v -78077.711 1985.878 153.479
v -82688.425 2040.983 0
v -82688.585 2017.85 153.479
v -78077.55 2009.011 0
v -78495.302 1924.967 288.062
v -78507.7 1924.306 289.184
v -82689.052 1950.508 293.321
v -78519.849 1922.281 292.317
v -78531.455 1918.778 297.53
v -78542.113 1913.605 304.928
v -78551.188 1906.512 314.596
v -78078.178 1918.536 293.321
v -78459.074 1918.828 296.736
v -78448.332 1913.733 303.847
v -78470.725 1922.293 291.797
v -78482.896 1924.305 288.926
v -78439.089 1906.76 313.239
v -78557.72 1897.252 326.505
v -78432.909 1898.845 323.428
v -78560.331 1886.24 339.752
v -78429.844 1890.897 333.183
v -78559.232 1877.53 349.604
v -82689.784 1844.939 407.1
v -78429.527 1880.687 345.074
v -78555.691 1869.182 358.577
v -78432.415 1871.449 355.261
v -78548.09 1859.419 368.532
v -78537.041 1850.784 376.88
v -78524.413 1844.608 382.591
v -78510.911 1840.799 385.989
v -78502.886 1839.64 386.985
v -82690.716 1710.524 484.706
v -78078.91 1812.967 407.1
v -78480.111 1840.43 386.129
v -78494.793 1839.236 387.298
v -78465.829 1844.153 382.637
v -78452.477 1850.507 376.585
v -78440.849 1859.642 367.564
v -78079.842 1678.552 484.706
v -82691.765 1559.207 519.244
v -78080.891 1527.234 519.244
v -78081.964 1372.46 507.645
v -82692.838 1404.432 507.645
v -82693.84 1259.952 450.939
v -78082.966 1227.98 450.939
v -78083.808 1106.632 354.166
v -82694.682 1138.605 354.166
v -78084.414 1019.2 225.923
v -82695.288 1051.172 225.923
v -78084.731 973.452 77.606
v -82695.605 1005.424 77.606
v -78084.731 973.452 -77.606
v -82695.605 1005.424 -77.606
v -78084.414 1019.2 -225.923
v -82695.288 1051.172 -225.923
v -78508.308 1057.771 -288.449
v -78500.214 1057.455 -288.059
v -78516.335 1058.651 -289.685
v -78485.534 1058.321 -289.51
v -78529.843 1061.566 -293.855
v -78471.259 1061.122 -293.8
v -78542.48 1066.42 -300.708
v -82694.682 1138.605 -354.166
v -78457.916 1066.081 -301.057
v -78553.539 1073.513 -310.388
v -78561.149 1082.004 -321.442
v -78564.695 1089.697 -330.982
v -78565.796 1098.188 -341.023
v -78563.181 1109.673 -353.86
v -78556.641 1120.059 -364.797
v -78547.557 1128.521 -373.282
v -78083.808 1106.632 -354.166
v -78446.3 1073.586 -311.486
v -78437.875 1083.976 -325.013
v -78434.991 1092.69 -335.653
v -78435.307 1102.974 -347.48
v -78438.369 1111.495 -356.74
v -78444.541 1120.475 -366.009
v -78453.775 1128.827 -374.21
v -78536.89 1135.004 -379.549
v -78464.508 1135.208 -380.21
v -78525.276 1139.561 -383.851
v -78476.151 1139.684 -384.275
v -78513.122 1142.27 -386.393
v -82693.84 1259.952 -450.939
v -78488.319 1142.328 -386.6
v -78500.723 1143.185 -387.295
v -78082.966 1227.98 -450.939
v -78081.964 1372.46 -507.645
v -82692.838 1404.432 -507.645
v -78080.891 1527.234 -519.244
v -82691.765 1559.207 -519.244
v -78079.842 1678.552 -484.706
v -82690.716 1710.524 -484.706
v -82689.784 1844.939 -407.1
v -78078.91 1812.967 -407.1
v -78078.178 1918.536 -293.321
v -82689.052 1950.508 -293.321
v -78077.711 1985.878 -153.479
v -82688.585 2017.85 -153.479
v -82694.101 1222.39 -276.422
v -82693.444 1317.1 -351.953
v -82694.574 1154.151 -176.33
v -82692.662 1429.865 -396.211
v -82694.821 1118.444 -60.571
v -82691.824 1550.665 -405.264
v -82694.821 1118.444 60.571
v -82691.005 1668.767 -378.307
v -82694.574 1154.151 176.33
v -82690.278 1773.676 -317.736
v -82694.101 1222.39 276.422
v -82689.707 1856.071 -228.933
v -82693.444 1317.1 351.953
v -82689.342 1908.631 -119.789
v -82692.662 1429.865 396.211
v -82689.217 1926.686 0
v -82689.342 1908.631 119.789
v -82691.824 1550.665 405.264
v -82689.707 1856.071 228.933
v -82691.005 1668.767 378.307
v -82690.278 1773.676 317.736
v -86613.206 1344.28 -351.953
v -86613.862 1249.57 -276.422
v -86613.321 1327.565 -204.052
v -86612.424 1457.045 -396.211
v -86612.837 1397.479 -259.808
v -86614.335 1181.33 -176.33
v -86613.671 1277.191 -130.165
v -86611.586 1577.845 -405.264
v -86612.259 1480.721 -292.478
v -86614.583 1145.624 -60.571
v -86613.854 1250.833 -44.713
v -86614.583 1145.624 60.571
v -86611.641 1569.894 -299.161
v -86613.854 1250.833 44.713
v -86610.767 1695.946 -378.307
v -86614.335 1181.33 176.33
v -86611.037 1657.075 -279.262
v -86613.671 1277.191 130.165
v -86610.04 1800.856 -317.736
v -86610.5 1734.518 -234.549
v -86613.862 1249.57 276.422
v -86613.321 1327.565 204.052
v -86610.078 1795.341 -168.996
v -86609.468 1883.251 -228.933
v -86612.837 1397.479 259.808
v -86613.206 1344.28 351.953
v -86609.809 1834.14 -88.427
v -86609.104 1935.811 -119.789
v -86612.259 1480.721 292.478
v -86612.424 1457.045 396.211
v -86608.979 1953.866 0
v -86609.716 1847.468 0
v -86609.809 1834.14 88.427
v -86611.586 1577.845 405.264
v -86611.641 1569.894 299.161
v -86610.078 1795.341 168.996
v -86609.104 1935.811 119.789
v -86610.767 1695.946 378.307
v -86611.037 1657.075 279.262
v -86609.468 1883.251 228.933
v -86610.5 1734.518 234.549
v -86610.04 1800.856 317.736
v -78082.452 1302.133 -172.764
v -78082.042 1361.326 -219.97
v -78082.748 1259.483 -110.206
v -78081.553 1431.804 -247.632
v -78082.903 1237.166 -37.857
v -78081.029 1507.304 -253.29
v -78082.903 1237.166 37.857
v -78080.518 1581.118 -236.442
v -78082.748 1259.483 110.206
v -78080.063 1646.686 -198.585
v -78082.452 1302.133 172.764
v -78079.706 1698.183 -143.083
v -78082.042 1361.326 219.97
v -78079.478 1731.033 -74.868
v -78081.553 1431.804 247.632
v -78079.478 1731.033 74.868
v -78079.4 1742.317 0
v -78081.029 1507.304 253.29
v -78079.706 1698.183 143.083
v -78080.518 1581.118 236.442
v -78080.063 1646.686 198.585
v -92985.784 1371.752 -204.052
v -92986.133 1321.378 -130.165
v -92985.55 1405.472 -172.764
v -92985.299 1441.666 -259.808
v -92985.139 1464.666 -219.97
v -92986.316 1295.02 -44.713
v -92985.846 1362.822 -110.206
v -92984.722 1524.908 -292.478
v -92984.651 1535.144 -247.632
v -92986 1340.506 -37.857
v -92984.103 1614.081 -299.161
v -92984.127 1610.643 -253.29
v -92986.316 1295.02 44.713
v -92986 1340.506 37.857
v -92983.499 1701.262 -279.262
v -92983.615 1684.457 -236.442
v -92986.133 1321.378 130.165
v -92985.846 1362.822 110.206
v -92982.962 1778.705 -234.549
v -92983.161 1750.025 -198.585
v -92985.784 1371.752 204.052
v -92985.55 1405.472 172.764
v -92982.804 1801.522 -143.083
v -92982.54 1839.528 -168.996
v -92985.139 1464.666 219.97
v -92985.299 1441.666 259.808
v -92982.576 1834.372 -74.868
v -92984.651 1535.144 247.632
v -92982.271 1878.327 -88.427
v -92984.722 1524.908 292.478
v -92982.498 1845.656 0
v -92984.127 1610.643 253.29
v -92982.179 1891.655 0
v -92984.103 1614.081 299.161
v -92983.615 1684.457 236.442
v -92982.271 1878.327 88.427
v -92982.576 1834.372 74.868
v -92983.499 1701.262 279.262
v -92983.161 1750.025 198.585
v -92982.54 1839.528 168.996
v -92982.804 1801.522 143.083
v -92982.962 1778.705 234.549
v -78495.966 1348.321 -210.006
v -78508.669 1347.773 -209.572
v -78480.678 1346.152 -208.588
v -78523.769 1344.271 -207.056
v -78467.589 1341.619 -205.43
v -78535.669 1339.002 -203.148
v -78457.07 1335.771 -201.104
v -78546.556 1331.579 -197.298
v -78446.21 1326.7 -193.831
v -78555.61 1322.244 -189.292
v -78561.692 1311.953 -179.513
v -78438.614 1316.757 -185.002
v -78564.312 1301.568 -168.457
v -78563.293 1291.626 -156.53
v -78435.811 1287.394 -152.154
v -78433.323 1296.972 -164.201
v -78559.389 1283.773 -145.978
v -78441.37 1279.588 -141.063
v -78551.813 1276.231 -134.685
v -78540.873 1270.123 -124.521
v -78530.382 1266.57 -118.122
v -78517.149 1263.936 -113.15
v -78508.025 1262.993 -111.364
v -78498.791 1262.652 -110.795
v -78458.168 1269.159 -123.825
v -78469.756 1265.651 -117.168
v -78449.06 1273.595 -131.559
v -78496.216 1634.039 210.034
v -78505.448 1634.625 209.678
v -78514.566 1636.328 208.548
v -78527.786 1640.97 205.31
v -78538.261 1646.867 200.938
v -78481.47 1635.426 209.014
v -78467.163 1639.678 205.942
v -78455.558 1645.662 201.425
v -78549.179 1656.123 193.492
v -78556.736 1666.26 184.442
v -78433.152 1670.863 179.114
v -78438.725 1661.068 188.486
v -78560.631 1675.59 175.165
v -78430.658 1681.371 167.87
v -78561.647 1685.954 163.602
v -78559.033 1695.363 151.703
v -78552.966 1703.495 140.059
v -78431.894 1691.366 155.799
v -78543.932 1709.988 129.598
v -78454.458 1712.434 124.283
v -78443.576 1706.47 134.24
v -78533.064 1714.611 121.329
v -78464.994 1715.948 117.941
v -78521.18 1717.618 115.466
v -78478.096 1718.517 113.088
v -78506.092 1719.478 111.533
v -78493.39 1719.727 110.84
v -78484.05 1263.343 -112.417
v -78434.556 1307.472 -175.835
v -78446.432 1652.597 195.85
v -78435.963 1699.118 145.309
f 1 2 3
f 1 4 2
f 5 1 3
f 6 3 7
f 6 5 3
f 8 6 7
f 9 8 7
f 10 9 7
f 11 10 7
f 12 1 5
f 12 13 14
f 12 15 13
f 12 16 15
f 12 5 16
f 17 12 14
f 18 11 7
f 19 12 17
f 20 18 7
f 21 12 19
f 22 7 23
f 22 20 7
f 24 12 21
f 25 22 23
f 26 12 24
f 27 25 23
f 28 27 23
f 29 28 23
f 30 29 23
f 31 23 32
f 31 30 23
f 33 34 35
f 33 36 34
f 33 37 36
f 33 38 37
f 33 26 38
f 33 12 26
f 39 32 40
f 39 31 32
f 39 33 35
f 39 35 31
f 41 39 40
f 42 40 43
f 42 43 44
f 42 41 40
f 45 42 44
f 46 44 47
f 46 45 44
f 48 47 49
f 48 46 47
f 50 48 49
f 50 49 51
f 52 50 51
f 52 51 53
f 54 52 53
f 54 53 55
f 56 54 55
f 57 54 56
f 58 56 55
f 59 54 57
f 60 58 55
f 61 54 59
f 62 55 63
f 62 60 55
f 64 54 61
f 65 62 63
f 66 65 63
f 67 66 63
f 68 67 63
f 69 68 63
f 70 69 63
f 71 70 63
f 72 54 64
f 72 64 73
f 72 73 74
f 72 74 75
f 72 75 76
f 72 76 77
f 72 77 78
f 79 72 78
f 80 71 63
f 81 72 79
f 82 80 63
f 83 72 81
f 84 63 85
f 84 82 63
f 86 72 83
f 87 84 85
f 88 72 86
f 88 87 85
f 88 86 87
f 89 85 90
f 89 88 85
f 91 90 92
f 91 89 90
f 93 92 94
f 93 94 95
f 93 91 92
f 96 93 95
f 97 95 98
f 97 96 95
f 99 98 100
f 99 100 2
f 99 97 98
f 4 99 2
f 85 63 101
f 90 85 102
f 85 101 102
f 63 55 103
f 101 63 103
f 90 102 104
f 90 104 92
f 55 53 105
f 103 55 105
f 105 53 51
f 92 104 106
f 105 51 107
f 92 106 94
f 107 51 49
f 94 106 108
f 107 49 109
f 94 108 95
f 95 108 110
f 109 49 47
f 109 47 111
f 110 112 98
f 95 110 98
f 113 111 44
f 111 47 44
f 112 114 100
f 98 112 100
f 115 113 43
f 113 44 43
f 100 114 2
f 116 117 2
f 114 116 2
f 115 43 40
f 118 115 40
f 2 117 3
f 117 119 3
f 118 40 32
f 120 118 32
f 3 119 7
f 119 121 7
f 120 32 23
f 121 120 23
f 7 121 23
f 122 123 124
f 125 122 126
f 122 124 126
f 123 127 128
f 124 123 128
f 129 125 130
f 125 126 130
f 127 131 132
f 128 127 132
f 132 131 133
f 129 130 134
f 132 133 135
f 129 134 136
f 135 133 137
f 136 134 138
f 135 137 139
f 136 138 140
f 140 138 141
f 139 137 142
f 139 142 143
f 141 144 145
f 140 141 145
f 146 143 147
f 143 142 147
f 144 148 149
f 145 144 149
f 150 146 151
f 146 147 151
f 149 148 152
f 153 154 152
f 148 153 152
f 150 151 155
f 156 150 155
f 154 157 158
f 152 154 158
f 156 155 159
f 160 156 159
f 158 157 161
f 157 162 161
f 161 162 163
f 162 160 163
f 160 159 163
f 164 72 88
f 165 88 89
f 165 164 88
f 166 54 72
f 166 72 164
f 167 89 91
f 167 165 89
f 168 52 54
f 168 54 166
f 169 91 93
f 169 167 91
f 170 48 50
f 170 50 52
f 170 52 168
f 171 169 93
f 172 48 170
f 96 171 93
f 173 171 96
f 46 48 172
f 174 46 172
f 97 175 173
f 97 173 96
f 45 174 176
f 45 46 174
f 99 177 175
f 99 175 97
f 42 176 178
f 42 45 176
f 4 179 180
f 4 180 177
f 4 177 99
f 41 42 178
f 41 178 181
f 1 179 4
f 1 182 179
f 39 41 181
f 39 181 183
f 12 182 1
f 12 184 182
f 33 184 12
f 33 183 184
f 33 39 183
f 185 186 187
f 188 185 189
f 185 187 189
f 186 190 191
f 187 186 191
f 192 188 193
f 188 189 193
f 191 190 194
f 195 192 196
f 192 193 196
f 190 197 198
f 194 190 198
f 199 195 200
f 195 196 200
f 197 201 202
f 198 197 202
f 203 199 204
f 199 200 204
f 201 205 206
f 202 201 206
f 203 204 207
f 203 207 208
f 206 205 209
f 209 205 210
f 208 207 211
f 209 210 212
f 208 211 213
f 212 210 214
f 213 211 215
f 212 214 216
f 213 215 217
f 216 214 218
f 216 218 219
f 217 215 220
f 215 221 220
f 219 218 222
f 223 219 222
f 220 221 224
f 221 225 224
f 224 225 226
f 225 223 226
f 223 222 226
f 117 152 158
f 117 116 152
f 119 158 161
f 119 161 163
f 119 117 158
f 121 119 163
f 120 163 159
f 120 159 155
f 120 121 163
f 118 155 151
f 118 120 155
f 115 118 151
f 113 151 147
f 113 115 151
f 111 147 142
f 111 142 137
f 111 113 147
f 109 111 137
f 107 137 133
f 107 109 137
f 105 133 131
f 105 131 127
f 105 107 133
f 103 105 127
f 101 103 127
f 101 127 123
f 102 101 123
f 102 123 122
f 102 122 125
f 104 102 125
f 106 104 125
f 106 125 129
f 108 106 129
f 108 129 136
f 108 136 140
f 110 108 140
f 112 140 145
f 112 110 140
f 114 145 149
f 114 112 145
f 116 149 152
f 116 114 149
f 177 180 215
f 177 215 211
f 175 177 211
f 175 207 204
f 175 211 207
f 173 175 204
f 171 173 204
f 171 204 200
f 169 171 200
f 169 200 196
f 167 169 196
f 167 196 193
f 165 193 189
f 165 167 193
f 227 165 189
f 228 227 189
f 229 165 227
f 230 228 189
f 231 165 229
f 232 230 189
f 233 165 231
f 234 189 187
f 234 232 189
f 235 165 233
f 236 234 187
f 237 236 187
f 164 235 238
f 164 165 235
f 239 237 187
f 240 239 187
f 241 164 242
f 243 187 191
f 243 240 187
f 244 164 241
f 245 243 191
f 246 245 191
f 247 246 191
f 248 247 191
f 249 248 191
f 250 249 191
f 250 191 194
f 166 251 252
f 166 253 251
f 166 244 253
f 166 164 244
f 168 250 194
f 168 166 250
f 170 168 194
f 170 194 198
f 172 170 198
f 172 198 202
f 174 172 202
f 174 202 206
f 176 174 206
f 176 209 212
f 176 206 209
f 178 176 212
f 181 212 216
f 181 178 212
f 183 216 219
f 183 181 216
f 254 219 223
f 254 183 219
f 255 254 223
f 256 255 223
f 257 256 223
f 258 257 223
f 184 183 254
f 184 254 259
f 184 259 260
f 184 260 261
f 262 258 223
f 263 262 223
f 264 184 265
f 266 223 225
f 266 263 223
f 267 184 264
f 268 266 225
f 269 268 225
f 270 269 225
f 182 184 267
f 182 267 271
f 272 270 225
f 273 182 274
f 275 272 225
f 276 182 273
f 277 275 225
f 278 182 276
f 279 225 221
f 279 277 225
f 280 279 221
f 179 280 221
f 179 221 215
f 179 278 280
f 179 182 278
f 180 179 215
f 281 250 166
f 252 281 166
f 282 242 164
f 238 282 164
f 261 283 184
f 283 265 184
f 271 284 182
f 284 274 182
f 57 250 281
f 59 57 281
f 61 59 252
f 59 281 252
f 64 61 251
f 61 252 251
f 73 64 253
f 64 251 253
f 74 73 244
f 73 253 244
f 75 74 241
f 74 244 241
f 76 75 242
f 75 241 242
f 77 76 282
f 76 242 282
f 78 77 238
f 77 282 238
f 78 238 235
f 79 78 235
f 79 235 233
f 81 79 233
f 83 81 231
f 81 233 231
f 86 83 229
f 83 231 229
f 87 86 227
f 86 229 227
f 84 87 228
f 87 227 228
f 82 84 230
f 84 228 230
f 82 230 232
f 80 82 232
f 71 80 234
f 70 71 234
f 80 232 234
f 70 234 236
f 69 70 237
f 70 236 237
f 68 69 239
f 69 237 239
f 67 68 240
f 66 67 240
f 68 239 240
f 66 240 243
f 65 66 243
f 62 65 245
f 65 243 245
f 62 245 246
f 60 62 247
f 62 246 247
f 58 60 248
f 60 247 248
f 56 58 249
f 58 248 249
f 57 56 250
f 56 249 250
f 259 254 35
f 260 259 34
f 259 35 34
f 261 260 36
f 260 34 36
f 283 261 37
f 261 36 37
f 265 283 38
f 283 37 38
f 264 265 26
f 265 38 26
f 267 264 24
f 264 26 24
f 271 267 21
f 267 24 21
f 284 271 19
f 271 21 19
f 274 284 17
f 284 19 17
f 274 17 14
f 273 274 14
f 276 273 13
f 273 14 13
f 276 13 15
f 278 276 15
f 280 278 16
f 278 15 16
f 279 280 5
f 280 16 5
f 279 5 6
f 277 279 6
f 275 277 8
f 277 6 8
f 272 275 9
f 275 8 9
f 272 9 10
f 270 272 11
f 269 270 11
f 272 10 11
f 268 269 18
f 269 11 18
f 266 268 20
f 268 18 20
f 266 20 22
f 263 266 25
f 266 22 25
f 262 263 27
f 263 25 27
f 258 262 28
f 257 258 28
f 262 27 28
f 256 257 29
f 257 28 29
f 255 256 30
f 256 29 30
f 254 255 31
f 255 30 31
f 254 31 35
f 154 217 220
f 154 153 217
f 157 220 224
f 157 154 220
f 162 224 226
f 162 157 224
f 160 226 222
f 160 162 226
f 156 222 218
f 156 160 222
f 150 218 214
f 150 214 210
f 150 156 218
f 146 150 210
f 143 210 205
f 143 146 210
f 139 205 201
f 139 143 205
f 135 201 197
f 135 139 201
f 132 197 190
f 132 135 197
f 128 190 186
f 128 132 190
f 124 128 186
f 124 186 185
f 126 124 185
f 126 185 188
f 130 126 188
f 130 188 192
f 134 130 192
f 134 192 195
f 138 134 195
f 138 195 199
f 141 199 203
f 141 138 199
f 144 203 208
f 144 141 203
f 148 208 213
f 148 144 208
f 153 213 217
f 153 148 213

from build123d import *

# Parameters (mm, degrees)
SWEEP1_PROFILE_R        = 300
SWEEP2_PROFILE_R        = 406.4
SWEEP3_PROFILE_R        = 520.7
SKETCH96_R              = 65.57064834
CUT_EXTRUDE1_DEPTH      = 3000
CUT_EXTRUDE2_DEPTH      = 14988.534162474
CUT_EXTRUDE2_DEPTH_BACK = 14988.534162474
SKETCH97_R              = 254


with BuildPart() as part:
    # Sweep1: sweep along a path in Sketch1
    with BuildLine(Plane.XY) as sweep1_path:
        Line((-92984.258788215, 1591.662495116), (-78081.160966393, 1488.323407048))
    # Sweep1 profile (on start of the path) → Sweep1 (sweep)
    with BuildSketch(Plane(origin=(-92984.258788215, 1591.662495116, 0), x_dir=(0.00693390092814686, 0.9999759602200039, 0), z_dir=(0.9999759602200039, -0.00693390092814686, 0))):
        Circle(SWEEP1_PROFILE_R)
    sweep(path=sweep1_path.line)

    # Sweep2: sweep along a path in Sketch18
    with BuildLine(Plane.XY) as sweep2_path:
        Line((-86611.796586025, 1547.47541129), (-78081.160966393, 1488.323407048))
    # Sweep2 profile (on start of the path) → Sweep2 (sweep)
    with BuildSketch(Plane(origin=(-86611.796586025, 1547.47541129, 0), x_dir=(0.006933900928146876, 0.9999759602200038, 0), z_dir=(0.9999759602200038, -0.006933900928146876, 0))):
        Circle(SWEEP2_PROFILE_R)
    sweep(path=sweep2_path.line)

    # Sweep3: sweep along a path in Sketch79
    with BuildLine(Plane.XY) as sweep3_path:
        Line((-82692.035001146, 1520.2955194), (-78081.160966393, 1488.323407048))
    # Sweep3 profile (on start of the path) → Sweep3 (sweep)
    with BuildSketch(Plane(origin=(-82692.035001146, 1520.2955194, 0), x_dir=(0.006933900928146895, 0.9999759602200038, 0), z_dir=(0.9999759602200038, -0.006933900928146895, 0))):
        Circle(SWEEP3_PROFILE_R)
    sweep(path=sweep3_path.line)

    # Sketch96 → Cut-Extrude1 (cut, symmetric)
    with BuildSketch(Plane(origin=(-1329.649342872, 16090.326379674, -14618.529062171), x_dir=(0.9606474516301055, 0.17774002711559994, -0.21345949601160855), z_dir=(0.005247183588808439, 0.7567251828430883, 0.6537120656034123))):
        with Locations(Location((-79846.413589942, 1633.478101155, 0), (0, 0, 253.875539532))):
            Circle(SKETCH96_R)
    extrude(amount=CUT_EXTRUDE1_DEPTH, both=True, mode=Mode.SUBTRACT)

    # Sketch97 → Cut-Extrude2 (cut, two sides: drawn at the far end of the back side and taken through both)
    with BuildSketch(Plane(origin=(-92990.824364442, 644.804664332, 0), x_dir=(0, 0, 1), z_dir=(-0.9999759602200039, 0.0069339009281468664, 0)).offset(-CUT_EXTRUDE2_DEPTH_BACK)):
        with Locations(Location((0, 946.880593585, 0), (0, 0, 90))):
            Circle(SKETCH97_R)
    extrude(amount=CUT_EXTRUDE2_DEPTH + CUT_EXTRUDE2_DEPTH_BACK, mode=Mode.SUBTRACT)


solid = part.part
